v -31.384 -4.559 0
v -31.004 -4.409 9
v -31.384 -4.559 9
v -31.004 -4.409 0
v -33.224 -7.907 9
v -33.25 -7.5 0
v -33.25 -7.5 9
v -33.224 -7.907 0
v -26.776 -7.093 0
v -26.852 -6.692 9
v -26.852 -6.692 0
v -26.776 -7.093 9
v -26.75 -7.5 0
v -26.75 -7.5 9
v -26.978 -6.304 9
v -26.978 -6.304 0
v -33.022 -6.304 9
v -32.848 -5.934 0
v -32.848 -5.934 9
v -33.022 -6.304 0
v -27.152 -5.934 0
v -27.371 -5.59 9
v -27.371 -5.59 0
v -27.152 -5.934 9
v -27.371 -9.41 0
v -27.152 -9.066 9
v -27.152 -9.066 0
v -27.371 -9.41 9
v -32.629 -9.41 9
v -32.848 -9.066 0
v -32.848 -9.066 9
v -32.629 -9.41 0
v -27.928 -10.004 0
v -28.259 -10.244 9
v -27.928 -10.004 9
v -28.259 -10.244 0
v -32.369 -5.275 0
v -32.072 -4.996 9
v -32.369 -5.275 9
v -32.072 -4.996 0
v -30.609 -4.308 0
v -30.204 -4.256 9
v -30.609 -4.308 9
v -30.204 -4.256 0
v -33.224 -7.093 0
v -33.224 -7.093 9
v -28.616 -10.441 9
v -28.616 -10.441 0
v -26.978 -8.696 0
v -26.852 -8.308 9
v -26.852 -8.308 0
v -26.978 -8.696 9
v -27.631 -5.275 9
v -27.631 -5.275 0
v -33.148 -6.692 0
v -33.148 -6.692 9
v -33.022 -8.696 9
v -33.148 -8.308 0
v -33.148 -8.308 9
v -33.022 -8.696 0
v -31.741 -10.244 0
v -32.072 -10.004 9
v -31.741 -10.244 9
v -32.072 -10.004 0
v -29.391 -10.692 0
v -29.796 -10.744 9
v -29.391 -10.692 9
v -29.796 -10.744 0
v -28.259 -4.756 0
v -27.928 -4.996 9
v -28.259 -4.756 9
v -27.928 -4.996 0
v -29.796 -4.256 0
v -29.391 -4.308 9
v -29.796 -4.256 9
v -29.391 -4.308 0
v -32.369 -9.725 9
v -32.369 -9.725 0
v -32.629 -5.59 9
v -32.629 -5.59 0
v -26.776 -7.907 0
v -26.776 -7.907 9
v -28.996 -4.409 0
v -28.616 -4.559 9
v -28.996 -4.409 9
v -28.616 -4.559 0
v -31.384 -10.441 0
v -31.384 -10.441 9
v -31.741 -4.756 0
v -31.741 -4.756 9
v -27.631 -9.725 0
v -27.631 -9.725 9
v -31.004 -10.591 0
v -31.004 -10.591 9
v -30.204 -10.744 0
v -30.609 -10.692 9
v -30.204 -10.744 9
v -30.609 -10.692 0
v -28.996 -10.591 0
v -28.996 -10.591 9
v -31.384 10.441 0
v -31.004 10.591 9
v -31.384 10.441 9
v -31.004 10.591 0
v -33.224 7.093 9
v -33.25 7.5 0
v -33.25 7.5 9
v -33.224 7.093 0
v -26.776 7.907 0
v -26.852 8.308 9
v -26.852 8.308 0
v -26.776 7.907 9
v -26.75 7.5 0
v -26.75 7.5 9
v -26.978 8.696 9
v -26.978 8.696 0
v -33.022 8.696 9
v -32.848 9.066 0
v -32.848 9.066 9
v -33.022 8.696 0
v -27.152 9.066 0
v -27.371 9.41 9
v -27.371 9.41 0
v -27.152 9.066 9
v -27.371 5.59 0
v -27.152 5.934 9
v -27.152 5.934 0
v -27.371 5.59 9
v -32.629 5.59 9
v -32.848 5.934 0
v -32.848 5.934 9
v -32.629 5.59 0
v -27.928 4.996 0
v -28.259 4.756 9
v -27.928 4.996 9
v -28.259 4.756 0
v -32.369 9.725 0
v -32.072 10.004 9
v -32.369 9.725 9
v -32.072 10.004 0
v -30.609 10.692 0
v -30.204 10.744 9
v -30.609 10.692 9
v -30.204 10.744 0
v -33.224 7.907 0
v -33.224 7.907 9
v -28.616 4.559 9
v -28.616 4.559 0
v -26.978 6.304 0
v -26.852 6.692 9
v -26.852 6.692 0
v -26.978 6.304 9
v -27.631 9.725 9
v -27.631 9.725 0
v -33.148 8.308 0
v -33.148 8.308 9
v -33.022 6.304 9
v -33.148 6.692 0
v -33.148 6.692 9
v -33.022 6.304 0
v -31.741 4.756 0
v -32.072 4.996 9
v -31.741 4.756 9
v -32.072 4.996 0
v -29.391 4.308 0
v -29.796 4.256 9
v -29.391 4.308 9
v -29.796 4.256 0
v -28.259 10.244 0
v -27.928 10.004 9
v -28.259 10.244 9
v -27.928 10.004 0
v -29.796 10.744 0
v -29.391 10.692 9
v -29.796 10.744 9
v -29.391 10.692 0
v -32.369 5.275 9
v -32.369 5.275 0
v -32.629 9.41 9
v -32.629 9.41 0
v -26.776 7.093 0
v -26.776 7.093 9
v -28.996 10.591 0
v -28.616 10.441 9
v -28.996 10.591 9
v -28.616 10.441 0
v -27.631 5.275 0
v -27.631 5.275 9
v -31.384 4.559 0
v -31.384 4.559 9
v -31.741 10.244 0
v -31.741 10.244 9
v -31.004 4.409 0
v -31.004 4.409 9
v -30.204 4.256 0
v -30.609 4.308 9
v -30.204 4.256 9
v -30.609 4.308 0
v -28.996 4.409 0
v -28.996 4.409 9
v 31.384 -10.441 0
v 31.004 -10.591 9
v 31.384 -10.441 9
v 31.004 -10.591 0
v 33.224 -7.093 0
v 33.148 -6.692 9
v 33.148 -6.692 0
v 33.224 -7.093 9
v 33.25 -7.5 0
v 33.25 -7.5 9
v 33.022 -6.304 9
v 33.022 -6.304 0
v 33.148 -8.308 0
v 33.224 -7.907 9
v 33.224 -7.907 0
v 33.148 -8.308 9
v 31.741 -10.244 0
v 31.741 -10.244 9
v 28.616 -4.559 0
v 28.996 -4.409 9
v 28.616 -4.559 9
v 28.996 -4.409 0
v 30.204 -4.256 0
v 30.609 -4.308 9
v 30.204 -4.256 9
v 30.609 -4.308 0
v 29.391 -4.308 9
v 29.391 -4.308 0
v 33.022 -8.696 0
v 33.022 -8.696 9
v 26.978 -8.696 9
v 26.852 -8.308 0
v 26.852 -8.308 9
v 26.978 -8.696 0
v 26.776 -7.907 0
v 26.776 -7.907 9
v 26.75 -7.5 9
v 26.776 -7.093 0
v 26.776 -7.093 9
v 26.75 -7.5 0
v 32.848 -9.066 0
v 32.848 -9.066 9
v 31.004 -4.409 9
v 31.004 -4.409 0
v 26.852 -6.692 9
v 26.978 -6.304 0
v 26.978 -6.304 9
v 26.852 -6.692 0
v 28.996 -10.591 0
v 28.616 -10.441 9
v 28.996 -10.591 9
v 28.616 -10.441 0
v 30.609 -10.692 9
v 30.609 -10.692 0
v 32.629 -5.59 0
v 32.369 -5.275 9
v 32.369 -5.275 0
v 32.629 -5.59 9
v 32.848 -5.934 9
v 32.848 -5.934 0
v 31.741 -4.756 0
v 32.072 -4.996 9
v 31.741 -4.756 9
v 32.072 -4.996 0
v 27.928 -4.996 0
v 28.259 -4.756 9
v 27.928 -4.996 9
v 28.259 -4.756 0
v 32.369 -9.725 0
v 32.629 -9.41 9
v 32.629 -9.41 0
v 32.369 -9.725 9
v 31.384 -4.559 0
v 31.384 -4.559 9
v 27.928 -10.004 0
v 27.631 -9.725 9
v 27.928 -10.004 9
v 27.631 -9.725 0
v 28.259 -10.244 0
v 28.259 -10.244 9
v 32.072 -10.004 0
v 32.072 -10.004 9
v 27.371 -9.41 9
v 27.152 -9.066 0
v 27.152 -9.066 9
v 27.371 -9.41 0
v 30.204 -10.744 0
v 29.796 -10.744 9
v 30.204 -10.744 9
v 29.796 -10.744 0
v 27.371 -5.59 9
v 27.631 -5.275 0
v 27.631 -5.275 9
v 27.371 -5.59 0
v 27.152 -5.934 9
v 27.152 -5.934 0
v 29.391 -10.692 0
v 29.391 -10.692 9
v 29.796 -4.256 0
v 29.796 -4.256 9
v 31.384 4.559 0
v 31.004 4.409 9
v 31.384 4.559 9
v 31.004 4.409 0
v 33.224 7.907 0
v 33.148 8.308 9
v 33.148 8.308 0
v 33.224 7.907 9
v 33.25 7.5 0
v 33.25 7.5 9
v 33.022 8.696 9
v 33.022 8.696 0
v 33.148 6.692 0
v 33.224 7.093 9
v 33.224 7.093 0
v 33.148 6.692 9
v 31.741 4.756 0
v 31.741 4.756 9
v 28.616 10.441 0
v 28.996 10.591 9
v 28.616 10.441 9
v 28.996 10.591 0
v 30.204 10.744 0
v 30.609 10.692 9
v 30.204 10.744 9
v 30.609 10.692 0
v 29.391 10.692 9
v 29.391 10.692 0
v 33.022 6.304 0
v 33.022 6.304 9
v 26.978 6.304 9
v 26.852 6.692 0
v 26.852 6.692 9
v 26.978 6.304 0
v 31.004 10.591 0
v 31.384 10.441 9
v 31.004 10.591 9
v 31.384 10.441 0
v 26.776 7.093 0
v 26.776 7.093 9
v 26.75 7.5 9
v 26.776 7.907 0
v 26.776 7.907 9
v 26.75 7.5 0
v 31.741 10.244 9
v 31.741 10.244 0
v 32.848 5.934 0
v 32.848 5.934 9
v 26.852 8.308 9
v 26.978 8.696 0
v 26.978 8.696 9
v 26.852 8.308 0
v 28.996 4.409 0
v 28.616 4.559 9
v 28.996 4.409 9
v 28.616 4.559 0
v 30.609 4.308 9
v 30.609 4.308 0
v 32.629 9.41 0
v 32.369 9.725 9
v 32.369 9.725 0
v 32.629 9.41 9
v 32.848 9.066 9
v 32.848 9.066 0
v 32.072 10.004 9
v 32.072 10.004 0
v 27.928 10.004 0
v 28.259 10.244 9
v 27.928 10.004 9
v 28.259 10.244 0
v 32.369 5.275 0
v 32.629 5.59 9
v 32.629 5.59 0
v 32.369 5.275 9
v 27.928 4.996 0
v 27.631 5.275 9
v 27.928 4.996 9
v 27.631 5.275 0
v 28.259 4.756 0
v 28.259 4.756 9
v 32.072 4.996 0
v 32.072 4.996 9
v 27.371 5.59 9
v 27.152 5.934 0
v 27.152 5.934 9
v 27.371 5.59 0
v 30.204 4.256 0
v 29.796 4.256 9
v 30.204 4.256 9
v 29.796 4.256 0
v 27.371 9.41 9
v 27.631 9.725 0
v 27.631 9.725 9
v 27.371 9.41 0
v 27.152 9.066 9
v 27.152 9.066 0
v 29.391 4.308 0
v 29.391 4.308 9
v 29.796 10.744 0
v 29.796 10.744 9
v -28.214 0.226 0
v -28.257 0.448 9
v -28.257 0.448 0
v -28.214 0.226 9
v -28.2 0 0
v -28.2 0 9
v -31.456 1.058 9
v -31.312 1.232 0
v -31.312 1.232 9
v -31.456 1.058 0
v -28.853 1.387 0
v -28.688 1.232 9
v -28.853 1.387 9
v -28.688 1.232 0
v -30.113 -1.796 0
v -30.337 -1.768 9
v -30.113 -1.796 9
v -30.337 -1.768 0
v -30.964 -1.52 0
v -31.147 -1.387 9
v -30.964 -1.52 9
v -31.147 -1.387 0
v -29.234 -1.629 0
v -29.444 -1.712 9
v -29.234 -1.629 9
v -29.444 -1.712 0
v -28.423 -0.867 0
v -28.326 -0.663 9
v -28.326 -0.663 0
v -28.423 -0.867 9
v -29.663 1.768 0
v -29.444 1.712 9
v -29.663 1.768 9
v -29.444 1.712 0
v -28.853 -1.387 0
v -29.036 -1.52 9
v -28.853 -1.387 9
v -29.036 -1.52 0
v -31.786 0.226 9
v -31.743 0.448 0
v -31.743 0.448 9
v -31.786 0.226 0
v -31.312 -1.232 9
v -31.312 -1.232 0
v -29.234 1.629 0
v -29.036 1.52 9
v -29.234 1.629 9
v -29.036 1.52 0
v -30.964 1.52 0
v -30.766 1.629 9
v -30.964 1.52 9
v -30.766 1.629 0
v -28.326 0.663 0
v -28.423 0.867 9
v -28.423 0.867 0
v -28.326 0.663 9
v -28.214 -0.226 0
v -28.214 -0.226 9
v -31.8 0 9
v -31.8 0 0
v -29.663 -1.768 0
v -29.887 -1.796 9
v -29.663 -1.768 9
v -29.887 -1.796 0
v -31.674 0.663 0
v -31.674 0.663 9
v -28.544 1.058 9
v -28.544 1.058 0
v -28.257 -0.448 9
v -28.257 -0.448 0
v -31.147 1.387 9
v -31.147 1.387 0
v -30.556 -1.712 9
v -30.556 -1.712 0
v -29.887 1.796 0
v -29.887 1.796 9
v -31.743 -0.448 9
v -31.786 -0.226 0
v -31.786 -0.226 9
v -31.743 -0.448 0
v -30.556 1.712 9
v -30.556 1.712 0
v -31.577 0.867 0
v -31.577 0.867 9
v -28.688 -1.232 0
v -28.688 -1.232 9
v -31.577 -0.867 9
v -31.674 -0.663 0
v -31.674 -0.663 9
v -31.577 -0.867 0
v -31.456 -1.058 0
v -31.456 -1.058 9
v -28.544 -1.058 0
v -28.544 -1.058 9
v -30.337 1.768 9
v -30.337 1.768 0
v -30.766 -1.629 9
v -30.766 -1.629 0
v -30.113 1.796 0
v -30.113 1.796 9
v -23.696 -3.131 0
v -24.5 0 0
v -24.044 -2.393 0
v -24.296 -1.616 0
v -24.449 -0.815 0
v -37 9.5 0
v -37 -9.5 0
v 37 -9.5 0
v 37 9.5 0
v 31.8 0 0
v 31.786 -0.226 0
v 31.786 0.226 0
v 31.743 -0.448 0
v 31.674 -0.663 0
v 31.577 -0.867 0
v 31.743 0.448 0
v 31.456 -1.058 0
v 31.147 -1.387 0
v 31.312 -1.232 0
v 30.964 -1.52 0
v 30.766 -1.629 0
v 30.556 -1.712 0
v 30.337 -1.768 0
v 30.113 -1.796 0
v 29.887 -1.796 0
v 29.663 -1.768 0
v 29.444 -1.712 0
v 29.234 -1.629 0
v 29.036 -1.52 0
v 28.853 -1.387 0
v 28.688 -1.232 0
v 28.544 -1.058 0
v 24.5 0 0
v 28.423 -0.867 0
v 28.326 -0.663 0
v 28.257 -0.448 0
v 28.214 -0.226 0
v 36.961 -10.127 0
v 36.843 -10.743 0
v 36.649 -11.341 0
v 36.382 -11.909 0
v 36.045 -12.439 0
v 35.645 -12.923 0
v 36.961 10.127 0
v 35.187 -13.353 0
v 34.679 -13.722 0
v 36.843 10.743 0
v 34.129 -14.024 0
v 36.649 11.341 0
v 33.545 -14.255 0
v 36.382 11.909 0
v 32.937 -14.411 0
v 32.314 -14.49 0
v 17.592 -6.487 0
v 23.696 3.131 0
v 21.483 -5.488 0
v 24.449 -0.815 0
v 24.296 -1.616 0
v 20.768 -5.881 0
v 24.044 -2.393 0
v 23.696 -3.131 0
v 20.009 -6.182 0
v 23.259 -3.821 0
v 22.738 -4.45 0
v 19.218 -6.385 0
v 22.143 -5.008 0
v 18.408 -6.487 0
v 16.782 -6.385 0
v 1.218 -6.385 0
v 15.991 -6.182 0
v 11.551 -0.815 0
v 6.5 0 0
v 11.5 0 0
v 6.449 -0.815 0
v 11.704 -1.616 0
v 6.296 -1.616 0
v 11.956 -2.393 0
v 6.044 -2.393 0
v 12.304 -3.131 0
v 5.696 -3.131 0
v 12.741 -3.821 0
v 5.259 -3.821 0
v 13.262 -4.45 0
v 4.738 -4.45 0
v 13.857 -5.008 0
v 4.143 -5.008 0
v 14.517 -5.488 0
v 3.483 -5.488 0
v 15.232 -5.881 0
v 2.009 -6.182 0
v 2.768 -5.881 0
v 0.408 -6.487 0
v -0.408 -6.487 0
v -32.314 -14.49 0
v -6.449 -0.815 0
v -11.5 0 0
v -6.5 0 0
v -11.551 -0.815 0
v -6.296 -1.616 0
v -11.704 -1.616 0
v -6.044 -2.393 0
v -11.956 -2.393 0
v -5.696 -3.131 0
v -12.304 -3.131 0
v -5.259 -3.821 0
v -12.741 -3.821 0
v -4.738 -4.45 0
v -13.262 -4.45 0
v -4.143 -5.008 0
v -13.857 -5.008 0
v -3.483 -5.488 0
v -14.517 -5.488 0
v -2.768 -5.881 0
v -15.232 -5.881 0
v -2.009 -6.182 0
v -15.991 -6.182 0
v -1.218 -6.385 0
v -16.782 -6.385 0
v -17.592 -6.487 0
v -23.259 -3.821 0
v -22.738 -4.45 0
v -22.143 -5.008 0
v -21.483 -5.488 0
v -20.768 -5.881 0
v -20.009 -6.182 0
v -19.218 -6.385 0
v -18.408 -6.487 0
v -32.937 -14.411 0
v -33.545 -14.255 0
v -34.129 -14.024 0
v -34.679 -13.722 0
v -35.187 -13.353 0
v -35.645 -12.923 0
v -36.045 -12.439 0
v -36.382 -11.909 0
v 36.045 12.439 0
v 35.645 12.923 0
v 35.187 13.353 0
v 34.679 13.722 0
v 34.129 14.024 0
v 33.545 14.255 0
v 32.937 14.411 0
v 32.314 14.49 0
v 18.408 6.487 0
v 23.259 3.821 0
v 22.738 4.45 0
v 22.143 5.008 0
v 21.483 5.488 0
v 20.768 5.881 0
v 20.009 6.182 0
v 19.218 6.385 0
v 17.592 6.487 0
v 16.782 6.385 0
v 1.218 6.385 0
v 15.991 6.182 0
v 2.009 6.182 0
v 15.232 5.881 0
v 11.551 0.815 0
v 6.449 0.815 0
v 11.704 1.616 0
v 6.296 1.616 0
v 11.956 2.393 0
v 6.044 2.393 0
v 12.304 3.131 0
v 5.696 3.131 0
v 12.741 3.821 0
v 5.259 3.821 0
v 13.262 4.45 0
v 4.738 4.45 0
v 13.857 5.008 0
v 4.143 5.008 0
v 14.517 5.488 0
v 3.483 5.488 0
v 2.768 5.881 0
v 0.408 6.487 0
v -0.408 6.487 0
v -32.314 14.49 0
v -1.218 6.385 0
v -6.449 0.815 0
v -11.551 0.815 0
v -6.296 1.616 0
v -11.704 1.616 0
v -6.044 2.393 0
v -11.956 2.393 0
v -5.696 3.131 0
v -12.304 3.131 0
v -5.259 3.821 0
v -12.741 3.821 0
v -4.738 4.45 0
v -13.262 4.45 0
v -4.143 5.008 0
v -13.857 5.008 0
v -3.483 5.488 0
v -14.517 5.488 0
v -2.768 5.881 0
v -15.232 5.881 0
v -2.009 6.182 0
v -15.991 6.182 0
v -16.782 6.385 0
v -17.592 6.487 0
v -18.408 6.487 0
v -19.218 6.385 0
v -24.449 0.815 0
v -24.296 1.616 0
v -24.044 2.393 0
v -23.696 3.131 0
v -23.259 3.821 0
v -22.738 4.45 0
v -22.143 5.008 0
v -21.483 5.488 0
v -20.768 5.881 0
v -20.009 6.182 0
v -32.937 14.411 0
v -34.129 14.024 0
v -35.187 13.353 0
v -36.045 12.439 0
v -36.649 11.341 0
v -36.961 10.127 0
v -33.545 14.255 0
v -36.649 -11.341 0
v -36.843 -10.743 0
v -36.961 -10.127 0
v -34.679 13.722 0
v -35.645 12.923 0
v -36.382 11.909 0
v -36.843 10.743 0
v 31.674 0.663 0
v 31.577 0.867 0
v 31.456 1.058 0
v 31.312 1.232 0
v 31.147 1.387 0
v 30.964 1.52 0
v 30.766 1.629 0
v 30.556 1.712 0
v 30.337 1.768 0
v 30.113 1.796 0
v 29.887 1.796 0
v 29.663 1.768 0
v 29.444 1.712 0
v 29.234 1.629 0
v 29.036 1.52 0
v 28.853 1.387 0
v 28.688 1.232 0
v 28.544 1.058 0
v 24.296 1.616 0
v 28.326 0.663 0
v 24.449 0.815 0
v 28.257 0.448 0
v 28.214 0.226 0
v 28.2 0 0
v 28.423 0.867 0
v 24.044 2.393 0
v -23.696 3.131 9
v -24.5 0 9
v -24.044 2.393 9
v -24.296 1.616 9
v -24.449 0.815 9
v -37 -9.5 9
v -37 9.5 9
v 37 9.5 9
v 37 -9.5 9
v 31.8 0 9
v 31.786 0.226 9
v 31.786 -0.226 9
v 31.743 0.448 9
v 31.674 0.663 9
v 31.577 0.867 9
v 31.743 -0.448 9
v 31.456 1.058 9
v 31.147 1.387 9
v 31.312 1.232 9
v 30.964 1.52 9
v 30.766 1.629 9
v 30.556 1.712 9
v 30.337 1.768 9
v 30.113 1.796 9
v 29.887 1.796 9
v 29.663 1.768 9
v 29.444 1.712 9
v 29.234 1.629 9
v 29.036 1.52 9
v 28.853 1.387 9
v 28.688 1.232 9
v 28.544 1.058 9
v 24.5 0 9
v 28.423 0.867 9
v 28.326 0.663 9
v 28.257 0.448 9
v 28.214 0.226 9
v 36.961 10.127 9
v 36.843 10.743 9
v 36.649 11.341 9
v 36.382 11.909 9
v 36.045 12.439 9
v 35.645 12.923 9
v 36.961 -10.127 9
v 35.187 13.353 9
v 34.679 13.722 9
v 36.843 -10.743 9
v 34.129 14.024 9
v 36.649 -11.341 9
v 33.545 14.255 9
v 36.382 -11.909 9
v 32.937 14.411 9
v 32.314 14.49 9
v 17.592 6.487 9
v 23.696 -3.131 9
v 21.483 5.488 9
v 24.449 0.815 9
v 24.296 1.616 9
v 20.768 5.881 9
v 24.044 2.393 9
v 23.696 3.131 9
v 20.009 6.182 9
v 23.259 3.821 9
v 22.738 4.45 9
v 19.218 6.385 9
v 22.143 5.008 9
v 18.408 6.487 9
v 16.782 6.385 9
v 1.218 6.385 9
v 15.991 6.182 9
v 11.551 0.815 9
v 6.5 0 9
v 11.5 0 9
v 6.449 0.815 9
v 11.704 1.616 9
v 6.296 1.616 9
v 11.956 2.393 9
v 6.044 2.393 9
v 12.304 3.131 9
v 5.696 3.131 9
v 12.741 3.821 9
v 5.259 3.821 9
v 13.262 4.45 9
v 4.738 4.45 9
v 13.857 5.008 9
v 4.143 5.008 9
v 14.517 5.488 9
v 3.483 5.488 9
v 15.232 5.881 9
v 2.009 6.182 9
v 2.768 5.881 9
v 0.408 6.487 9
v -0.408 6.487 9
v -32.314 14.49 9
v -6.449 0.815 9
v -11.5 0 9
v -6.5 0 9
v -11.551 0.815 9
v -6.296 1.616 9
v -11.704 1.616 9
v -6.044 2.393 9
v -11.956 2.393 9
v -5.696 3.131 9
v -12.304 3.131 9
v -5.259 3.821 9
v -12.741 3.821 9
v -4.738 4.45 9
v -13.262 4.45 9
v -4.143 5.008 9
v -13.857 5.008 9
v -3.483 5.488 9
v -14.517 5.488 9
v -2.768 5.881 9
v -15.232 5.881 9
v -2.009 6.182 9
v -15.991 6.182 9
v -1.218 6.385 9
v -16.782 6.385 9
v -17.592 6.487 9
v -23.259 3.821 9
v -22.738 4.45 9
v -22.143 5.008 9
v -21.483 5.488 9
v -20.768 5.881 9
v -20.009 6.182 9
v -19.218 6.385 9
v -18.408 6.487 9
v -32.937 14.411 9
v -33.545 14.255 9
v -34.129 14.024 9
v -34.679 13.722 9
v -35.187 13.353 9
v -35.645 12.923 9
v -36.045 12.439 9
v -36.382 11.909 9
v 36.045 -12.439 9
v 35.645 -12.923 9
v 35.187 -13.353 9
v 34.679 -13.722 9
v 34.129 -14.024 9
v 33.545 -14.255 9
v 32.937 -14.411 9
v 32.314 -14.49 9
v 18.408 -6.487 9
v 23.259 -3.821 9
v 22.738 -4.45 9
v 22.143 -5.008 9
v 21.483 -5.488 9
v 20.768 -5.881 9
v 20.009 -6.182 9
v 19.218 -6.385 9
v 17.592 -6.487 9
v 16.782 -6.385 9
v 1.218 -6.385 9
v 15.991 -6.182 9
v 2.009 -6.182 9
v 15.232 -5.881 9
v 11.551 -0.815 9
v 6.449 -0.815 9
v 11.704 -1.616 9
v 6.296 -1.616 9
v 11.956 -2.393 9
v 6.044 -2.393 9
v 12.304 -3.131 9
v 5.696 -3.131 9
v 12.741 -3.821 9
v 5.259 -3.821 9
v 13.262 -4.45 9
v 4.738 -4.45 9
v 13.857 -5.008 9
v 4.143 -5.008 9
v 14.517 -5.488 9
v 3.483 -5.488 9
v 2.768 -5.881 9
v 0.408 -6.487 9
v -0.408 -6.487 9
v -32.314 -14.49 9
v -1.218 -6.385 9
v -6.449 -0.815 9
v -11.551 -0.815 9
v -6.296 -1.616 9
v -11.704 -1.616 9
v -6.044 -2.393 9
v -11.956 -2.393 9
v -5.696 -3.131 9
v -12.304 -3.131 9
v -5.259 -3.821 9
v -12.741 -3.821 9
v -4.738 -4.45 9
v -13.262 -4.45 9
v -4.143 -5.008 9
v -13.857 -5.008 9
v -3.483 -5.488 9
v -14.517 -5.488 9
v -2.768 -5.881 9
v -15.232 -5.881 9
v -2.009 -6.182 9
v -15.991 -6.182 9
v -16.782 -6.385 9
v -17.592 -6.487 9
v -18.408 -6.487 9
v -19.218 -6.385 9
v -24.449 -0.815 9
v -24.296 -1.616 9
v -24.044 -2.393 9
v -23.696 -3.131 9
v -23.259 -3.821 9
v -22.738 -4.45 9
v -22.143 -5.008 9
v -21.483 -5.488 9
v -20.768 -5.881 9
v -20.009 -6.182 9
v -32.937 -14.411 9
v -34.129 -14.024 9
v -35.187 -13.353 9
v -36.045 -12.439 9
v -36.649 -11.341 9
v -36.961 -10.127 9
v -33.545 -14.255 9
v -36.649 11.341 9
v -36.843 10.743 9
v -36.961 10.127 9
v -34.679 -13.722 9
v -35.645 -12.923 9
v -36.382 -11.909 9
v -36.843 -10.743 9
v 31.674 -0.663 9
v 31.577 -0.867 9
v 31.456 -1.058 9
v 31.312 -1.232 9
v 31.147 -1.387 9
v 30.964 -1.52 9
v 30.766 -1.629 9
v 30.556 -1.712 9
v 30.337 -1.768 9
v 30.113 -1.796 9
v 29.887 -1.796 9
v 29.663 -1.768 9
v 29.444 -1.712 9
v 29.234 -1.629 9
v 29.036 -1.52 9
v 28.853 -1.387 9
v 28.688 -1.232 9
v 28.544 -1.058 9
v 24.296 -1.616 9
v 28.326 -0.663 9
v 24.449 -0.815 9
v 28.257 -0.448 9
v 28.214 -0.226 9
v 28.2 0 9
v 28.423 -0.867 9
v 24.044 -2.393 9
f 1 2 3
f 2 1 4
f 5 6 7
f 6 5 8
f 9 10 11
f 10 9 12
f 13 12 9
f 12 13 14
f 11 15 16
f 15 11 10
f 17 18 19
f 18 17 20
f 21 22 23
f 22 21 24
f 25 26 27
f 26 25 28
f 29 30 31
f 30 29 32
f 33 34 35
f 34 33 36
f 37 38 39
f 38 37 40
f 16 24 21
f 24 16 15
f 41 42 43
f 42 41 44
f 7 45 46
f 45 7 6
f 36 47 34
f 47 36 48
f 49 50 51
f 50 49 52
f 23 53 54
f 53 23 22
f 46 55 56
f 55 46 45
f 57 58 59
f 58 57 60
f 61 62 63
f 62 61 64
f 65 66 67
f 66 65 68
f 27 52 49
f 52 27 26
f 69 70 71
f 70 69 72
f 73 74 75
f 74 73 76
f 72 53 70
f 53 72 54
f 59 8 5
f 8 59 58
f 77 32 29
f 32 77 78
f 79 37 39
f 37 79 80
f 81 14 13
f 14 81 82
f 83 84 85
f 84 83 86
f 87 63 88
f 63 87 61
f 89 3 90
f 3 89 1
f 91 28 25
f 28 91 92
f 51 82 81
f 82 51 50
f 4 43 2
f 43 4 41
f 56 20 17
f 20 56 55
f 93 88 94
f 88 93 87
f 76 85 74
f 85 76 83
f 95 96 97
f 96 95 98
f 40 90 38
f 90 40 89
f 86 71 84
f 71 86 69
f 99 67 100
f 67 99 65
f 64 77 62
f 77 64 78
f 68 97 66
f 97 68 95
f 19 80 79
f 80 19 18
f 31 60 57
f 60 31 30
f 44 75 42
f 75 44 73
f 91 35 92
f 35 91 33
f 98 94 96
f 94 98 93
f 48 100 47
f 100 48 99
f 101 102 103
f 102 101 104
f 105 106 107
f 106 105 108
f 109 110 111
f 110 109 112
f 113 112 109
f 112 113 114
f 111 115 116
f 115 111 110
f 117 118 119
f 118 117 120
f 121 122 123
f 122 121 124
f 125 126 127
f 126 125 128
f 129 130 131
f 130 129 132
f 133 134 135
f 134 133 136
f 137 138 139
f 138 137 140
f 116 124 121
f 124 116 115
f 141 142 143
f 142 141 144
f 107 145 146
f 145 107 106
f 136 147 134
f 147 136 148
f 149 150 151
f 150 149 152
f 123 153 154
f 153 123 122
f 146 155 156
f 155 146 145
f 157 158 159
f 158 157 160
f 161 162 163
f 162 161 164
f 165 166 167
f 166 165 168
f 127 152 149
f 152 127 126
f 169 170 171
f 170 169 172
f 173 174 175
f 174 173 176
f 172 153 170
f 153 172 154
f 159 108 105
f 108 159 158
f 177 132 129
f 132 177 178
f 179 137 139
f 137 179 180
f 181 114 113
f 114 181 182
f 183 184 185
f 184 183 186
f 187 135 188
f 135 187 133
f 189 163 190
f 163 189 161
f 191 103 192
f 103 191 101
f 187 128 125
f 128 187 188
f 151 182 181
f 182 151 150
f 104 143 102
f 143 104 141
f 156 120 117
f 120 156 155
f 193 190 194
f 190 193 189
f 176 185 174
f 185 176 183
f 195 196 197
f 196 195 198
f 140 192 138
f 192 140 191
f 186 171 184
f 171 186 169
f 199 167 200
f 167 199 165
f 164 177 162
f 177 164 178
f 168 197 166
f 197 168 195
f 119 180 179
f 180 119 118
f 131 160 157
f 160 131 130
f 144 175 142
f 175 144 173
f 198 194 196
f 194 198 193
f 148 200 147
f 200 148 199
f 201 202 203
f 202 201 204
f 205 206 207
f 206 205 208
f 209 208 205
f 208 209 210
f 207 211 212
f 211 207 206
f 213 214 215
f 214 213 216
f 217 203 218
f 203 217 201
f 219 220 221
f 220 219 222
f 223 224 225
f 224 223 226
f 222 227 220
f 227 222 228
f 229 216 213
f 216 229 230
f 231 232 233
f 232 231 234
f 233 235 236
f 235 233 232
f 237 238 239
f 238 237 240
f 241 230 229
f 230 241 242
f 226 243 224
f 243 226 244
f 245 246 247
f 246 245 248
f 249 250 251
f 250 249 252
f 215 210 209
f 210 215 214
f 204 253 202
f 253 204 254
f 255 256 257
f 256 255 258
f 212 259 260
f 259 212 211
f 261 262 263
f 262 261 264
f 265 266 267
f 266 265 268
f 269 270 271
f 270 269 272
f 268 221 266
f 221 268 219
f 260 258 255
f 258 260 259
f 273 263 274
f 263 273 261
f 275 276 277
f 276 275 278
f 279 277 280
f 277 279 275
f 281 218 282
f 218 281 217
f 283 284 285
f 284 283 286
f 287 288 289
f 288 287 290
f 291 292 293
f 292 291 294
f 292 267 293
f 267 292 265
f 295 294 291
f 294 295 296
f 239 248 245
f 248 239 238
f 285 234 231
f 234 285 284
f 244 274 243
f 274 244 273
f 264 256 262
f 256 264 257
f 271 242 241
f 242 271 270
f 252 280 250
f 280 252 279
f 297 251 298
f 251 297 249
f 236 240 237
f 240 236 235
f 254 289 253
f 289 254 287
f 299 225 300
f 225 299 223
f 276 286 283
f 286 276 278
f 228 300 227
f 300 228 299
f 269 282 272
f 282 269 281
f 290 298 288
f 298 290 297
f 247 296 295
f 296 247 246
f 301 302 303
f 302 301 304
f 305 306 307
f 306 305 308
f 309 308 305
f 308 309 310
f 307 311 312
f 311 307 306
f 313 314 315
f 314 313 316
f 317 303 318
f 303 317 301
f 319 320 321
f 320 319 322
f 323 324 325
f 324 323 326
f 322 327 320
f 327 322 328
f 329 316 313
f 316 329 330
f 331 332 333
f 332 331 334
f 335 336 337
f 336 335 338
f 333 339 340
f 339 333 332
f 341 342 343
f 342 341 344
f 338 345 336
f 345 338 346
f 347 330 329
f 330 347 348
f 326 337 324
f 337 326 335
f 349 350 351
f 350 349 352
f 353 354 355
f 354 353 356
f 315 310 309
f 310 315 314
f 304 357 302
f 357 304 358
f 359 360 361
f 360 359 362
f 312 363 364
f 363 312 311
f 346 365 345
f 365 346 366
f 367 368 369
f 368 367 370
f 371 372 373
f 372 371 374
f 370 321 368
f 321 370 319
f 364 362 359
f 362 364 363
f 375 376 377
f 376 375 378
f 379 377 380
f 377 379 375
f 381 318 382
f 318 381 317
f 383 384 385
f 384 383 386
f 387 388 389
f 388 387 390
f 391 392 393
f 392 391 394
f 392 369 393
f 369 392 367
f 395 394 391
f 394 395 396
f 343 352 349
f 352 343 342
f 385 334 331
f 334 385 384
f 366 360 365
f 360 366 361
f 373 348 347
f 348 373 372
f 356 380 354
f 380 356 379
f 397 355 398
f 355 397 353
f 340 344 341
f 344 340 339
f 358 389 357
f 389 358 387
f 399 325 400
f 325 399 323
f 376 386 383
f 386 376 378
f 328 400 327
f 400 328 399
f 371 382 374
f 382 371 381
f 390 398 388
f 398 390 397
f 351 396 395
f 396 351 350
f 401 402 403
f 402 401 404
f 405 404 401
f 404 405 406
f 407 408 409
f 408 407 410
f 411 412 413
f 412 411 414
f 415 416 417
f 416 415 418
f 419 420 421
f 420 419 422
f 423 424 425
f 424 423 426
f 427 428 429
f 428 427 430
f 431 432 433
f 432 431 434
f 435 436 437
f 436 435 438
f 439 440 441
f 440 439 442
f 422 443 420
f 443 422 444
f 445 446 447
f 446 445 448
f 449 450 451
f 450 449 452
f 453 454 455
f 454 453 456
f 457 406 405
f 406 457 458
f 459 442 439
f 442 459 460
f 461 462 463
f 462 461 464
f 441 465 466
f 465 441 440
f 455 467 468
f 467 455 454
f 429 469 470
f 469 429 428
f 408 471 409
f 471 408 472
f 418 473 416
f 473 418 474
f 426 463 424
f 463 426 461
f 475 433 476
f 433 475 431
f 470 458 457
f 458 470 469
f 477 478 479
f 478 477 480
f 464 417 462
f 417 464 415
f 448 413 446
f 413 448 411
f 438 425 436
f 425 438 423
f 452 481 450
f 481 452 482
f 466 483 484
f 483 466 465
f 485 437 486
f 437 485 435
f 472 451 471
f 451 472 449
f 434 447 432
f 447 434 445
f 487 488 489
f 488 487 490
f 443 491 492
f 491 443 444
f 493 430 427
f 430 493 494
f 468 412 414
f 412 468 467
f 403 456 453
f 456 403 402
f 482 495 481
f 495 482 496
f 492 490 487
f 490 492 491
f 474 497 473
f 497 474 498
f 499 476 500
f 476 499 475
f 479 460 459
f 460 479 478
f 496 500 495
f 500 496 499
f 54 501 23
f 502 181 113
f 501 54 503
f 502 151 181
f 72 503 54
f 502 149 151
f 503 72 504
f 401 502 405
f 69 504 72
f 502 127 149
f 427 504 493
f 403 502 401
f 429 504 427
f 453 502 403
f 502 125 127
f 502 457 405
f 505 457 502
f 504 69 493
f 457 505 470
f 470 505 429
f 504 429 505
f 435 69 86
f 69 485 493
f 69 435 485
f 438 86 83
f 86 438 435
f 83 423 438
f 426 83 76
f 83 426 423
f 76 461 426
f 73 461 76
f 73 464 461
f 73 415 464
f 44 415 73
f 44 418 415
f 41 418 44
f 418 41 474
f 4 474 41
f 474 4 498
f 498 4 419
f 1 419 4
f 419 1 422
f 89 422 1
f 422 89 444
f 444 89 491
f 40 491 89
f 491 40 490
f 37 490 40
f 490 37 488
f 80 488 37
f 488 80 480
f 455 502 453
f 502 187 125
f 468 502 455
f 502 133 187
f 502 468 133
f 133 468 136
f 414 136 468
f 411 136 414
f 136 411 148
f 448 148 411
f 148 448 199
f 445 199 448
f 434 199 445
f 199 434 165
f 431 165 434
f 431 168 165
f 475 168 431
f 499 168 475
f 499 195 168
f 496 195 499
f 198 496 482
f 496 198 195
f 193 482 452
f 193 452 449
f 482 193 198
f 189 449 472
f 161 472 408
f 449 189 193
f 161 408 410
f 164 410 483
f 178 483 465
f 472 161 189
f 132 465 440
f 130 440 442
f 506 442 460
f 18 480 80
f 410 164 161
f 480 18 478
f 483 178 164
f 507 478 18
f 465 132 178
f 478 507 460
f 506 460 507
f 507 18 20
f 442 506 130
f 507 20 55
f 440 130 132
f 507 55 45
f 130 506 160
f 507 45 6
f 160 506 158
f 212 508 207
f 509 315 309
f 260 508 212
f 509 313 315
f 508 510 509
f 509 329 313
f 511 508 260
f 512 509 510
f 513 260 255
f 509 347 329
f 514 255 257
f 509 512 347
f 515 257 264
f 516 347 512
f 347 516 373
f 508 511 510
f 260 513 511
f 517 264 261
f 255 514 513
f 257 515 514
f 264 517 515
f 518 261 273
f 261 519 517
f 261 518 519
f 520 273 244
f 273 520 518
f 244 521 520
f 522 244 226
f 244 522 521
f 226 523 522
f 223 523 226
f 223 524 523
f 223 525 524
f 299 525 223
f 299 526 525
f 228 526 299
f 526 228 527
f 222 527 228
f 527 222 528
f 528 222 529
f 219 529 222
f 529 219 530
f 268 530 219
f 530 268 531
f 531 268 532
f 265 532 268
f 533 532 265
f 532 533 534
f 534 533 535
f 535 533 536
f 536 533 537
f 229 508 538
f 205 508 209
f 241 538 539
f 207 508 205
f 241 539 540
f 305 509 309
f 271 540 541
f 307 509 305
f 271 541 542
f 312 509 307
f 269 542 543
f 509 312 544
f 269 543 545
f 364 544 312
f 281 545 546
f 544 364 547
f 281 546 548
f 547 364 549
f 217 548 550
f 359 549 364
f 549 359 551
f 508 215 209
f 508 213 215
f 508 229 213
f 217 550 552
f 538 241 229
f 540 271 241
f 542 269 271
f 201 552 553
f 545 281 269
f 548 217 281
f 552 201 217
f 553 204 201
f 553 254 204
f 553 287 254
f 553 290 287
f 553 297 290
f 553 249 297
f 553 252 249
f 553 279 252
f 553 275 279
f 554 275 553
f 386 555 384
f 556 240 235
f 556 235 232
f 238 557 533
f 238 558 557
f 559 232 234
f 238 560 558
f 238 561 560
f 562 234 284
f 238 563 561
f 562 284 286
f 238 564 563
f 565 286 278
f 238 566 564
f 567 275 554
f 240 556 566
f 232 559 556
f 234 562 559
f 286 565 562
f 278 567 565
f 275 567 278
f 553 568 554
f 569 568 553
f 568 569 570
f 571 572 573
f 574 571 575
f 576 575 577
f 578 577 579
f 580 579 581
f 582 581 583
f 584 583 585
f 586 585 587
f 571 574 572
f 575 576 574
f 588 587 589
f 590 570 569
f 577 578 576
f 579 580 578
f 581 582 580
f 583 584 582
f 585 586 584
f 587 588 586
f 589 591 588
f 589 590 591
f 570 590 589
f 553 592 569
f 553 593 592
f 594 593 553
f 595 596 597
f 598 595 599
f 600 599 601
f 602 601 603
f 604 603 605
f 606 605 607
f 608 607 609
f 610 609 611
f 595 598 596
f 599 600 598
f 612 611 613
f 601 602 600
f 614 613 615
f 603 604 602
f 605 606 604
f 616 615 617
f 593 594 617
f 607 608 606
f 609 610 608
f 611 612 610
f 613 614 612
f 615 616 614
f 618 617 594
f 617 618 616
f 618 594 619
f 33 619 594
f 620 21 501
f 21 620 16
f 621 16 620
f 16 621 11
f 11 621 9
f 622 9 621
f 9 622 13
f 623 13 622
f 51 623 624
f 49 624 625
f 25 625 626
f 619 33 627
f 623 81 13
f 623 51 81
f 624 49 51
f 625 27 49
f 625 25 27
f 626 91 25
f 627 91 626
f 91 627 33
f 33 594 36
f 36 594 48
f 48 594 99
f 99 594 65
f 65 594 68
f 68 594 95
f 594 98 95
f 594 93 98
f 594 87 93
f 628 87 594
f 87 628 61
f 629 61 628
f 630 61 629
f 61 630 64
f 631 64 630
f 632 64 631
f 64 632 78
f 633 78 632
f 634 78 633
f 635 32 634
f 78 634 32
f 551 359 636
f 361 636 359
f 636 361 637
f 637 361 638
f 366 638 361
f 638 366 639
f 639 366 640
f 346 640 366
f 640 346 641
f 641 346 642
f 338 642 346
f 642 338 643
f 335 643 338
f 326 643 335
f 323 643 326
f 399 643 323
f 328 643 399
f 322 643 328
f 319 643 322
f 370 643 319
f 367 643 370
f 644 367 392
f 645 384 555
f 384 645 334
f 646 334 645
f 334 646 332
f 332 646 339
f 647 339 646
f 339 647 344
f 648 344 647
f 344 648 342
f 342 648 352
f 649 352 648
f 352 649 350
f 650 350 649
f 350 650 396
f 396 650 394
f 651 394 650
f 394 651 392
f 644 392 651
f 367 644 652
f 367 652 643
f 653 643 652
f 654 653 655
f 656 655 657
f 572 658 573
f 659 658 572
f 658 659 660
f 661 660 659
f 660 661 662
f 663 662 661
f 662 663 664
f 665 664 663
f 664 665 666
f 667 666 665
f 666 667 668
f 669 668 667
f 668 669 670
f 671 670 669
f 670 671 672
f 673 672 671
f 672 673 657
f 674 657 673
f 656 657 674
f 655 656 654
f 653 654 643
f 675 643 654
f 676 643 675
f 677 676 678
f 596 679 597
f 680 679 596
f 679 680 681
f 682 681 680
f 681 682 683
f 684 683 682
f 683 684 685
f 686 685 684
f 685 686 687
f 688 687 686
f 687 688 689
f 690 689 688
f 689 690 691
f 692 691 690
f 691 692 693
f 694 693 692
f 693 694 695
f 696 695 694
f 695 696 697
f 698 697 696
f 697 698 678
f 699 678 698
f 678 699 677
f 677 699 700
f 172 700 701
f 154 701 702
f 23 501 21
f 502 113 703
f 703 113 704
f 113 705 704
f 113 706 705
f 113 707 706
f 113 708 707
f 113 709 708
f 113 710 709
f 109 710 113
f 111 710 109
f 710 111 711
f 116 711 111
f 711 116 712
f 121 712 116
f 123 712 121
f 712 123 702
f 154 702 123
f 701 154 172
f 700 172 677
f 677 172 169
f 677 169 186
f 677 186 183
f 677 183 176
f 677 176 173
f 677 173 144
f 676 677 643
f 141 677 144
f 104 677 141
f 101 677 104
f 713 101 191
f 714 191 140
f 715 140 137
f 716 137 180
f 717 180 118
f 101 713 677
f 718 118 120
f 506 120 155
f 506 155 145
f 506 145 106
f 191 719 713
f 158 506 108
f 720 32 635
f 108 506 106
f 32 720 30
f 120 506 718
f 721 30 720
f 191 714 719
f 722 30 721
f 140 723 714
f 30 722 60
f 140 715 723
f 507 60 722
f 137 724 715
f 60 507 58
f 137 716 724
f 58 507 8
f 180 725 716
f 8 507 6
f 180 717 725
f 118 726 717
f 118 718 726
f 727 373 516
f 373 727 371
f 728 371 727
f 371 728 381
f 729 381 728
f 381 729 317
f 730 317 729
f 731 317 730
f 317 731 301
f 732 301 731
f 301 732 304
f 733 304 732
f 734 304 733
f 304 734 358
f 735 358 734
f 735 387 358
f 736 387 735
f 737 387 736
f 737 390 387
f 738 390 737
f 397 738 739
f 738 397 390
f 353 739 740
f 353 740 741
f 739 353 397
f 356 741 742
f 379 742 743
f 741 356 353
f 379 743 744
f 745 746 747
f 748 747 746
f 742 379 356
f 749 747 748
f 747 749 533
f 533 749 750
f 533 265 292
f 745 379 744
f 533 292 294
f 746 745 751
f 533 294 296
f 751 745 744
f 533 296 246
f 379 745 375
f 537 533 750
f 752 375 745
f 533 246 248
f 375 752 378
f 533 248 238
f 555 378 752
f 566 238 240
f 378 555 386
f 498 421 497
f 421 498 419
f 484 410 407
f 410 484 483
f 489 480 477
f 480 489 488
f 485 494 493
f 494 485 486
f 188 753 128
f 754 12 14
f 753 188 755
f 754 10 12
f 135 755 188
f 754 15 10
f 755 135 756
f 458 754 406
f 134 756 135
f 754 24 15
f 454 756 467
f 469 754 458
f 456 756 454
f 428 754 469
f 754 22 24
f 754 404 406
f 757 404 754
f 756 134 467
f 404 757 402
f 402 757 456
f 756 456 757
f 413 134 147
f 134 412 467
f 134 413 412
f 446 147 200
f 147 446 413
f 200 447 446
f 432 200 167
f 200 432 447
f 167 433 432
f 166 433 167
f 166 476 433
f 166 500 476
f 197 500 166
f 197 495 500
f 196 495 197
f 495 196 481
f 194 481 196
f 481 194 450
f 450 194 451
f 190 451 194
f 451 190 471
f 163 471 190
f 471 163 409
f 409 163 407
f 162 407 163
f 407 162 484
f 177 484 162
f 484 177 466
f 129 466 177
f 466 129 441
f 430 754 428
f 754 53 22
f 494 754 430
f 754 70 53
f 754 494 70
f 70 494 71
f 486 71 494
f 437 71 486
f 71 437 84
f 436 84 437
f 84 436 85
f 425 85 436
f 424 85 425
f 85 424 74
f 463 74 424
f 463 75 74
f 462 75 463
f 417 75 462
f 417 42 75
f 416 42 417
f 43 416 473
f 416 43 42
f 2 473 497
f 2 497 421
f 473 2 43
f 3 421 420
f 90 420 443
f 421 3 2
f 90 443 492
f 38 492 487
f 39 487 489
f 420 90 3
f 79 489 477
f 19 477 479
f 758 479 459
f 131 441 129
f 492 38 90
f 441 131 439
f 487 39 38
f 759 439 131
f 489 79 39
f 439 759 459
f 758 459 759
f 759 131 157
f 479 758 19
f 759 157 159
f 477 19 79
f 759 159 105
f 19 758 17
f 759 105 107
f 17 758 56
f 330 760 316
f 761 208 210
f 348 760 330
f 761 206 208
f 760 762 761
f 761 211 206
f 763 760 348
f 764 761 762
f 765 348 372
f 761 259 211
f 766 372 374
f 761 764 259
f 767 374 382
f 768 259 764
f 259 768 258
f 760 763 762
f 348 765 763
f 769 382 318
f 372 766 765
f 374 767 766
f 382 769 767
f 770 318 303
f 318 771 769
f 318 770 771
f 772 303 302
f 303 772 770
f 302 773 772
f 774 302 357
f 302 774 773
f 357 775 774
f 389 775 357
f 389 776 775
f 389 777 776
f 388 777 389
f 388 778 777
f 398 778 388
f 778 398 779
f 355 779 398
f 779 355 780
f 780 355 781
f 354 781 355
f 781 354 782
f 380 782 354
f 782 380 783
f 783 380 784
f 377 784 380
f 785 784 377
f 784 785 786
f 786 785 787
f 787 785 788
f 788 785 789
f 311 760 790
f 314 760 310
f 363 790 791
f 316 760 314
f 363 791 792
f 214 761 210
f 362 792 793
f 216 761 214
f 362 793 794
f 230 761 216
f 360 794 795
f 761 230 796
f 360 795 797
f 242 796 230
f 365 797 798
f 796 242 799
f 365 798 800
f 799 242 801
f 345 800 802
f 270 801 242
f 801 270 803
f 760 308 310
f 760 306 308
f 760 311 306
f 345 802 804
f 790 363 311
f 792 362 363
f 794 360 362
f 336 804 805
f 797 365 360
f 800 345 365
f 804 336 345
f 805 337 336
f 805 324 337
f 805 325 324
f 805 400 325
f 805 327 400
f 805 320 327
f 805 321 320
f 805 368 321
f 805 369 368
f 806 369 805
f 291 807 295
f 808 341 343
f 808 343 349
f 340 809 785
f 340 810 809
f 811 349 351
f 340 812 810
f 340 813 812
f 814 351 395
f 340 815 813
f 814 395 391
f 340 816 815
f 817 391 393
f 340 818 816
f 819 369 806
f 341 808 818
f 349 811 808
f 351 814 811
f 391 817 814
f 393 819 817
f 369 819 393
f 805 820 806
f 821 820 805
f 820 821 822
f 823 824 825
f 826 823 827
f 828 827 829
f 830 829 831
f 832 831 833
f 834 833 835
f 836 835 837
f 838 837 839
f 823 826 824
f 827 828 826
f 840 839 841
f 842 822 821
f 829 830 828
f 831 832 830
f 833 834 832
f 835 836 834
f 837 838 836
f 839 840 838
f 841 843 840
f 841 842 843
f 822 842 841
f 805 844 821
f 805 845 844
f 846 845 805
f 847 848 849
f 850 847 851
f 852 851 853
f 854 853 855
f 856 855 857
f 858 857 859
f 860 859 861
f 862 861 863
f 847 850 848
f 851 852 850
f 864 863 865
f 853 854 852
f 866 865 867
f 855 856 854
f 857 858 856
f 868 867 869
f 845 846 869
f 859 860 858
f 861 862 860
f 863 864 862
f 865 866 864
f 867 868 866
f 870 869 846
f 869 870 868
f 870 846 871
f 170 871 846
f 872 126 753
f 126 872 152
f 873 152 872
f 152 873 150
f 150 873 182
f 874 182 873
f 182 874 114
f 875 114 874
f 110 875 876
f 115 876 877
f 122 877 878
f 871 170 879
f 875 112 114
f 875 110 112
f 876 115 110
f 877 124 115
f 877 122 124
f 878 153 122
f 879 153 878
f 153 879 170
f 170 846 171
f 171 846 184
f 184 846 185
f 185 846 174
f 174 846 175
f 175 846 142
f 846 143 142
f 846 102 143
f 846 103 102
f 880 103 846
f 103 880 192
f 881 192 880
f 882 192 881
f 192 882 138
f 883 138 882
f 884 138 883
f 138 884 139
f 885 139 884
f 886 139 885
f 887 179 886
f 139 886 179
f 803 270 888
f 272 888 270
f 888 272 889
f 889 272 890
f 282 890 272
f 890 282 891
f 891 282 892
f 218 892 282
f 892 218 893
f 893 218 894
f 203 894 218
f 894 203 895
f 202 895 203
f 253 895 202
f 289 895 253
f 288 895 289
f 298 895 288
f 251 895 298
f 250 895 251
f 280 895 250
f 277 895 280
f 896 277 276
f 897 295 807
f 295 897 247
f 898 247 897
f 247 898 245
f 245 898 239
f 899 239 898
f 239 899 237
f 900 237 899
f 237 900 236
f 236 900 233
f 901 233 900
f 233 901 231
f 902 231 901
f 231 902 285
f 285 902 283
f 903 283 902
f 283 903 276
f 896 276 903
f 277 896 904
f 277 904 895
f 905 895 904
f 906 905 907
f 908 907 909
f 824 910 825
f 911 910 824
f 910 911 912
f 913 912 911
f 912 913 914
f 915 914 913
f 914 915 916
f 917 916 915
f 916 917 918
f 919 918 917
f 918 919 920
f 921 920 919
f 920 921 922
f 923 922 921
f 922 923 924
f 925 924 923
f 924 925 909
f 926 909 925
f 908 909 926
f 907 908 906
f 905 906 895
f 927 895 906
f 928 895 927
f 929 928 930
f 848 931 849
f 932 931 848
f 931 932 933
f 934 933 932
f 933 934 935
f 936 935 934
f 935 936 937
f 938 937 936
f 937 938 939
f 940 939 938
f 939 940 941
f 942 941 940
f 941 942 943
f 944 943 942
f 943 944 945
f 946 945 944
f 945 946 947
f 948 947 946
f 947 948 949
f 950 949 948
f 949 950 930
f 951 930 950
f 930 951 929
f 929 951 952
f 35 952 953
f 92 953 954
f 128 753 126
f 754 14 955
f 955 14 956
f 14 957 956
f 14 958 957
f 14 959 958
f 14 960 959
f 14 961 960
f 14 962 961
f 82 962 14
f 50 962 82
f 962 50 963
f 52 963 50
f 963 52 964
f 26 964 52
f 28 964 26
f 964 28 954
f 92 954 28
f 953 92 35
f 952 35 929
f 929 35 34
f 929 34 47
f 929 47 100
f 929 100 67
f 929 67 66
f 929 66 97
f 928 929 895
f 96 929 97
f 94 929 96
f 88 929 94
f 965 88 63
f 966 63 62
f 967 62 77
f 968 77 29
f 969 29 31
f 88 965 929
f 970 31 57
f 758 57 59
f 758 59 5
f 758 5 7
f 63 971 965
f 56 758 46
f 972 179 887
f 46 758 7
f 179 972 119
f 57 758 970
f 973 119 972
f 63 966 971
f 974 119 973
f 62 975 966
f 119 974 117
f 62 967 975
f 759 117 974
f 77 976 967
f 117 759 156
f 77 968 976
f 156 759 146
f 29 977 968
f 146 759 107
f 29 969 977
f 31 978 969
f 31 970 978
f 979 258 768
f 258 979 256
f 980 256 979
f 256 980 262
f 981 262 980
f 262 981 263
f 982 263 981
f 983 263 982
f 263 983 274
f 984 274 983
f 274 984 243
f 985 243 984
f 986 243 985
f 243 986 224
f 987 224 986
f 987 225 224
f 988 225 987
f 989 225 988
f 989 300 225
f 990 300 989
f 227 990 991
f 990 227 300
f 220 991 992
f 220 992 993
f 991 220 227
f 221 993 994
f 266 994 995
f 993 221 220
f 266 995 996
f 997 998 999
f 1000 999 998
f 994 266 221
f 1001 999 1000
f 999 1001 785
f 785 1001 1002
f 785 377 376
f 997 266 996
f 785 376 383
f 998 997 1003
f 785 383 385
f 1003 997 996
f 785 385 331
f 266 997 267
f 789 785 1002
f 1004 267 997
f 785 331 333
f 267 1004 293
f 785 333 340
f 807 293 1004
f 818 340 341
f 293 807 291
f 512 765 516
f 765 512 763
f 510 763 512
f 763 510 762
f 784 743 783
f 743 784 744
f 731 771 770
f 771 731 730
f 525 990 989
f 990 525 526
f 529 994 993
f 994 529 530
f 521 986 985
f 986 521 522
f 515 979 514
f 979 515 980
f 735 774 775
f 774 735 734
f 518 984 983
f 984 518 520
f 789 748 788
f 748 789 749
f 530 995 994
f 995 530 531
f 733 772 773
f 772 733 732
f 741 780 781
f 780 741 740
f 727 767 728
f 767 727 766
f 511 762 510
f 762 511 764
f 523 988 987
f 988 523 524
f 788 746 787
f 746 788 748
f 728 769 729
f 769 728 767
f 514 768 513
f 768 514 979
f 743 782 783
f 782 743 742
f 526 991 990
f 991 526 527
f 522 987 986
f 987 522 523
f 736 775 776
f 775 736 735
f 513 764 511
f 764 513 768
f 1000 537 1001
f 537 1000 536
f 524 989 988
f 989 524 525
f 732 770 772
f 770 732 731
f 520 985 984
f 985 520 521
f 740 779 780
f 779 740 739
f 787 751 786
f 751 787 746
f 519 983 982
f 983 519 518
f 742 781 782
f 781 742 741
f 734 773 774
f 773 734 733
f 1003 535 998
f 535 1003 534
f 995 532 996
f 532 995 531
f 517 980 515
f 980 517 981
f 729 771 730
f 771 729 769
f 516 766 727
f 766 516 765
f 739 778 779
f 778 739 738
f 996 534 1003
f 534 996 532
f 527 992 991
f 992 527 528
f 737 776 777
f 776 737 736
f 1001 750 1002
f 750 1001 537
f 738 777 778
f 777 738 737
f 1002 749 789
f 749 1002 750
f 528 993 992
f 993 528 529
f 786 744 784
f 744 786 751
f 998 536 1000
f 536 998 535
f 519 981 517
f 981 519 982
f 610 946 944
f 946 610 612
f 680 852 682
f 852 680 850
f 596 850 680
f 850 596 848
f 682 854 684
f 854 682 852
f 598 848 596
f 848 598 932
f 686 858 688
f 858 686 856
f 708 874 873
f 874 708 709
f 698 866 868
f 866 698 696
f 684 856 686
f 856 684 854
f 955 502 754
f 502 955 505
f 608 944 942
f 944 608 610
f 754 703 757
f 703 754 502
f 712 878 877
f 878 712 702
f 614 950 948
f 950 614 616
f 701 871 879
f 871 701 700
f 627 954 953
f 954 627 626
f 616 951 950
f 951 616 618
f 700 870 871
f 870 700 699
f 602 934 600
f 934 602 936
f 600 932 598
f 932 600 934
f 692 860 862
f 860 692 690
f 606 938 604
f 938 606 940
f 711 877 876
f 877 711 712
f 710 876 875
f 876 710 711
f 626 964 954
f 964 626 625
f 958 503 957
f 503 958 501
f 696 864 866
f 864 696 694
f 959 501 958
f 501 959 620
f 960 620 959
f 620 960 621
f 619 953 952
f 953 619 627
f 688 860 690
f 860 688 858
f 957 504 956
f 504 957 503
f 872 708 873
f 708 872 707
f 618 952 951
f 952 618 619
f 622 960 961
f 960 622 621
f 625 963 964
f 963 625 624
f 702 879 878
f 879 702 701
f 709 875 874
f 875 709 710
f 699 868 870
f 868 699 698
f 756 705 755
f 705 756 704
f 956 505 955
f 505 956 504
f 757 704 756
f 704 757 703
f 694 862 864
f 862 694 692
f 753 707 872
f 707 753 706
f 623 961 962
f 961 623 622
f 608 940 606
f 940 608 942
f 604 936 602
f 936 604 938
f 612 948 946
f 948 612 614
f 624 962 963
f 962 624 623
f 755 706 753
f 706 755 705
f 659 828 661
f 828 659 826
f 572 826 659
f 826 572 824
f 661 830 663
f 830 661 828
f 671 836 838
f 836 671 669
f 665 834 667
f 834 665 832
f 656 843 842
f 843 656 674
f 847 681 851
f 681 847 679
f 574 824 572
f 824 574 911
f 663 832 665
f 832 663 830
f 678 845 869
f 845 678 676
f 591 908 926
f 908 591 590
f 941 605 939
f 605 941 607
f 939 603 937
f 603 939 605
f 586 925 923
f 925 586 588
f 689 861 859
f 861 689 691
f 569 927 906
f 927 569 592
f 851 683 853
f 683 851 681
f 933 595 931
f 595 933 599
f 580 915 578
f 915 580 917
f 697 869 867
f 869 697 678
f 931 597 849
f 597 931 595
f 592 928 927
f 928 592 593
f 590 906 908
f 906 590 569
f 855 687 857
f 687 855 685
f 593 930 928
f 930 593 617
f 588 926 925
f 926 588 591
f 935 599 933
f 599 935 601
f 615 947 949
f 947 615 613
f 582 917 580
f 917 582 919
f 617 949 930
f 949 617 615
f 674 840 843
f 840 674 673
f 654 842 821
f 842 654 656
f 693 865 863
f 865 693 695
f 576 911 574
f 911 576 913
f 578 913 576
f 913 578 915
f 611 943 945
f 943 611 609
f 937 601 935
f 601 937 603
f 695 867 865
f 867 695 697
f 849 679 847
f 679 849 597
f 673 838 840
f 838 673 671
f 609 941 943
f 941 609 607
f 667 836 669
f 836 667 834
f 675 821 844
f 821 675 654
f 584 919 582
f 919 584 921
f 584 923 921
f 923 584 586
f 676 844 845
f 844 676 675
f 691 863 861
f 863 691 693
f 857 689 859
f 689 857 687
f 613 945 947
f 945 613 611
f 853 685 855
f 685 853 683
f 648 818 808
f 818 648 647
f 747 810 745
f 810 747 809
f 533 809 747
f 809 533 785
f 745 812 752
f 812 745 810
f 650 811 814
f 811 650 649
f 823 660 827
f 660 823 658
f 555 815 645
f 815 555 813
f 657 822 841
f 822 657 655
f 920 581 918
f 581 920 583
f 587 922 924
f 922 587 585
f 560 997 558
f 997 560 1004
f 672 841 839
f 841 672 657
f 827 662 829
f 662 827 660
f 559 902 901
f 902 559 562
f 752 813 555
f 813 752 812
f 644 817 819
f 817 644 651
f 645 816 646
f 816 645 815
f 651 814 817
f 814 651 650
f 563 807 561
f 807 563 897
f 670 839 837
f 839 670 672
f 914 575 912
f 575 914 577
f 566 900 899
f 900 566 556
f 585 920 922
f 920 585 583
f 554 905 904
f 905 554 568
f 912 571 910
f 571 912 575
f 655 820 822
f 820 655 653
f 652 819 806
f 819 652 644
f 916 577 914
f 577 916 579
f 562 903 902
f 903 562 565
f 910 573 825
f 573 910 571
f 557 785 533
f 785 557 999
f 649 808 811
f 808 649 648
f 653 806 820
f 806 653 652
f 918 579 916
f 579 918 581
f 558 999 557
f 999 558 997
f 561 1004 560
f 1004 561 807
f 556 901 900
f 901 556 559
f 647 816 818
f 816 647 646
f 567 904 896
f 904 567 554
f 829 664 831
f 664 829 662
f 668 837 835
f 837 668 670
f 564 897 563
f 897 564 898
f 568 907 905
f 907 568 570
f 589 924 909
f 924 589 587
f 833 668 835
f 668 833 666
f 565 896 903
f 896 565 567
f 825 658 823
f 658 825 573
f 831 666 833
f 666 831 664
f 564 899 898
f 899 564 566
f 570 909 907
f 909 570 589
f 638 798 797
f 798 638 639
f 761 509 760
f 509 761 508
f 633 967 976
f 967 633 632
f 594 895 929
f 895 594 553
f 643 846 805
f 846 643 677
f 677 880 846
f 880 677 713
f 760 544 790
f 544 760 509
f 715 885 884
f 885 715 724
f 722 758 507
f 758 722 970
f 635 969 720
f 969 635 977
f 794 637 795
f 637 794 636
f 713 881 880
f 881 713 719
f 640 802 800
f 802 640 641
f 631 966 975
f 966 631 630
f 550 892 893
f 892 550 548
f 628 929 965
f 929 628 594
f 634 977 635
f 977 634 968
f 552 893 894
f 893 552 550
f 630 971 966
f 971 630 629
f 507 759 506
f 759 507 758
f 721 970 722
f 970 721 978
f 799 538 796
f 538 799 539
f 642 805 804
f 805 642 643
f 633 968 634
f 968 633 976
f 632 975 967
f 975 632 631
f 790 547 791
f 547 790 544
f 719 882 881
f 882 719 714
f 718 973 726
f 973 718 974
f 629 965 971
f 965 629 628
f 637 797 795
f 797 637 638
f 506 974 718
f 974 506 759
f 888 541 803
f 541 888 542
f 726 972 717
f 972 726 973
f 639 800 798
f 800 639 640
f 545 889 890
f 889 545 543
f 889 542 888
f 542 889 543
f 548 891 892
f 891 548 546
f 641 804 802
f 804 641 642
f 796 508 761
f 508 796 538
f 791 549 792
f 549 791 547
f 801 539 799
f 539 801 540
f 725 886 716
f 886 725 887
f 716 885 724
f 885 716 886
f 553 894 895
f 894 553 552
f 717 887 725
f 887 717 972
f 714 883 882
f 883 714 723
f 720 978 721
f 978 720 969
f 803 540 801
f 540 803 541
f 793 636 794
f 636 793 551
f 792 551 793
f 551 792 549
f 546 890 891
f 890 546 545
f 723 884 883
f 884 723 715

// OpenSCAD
$fn = 50;


difference() {
	union() {
		hull() {
			translate(v = [-32.0000000000, 9.5000000000, 0]) {
				cylinder(h = 9, r = 5);
			}
			translate(v = [32.0000000000, 9.5000000000, 0]) {
				cylinder(h = 9, r = 5);
			}
			translate(v = [-32.0000000000, -9.5000000000, 0]) {
				cylinder(h = 9, r = 5);
			}
			translate(v = [32.0000000000, -9.5000000000, 0]) {
				cylinder(h = 9, r = 5);
			}
		}
	}
	union() {
		#translate(v = [-30.0000000000, -7.5000000000, 0]) {
			cylinder(h = 9, r = 3.2500000000);
		}
		#translate(v = [-30.0000000000, 7.5000000000, 0]) {
			cylinder(h = 9, r = 3.2500000000);
		}
		#translate(v = [30.0000000000, -7.5000000000, 0]) {
			cylinder(h = 9, r = 3.2500000000);
		}
		#translate(v = [30.0000000000, 7.5000000000, 0]) {
			cylinder(h = 9, r = 3.2500000000);
		}
		#translate(v = [-30.0000000000, -7.5000000000, -100.0000000000]) {
			cylinder(h = 200, r = 3.2500000000);
		}
		#translate(v = [-30.0000000000, 7.5000000000, -100.0000000000]) {
			cylinder(h = 200, r = 3.2500000000);
		}
		#translate(v = [30.0000000000, -7.5000000000, -100.0000000000]) {
			cylinder(h = 200, r = 3.2500000000);
		}
		#translate(v = [30.0000000000, 7.5000000000, -100.0000000000]) {
			cylinder(h = 200, r = 3.2500000000);
		}
		#translate(v = [-30.0000000000, -7.5000000000, 0]) {
			cylinder(h = 9, r = 1.8000000000);
		}
		#translate(v = [-30.0000000000, 0.0000000000, 0]) {
			cylinder(h = 9, r = 1.8000000000);
		}
		#translate(v = [-30.0000000000, 7.5000000000, 0]) {
			cylinder(h = 9, r = 1.8000000000);
		}
		#translate(v = [30.0000000000, -7.5000000000, 0]) {
			cylinder(h = 9, r = 1.8000000000);
		}
		#translate(v = [30.0000000000, 0.0000000000, 0]) {
			cylinder(h = 9, r = 1.8000000000);
		}
		#translate(v = [30.0000000000, 7.5000000000, 0]) {
			cylinder(h = 9, r = 1.8000000000);
		}
		#translate(v = [-30.0000000000, -7.5000000000, 0]) {
			cylinder(h = 9, r = 1.8000000000);
		}
		#translate(v = [-30.0000000000, 0.0000000000, 0]) {
			cylinder(h = 9, r = 1.8000000000);
		}
		#translate(v = [-30.0000000000, 7.5000000000, 0]) {
			cylinder(h = 9, r = 1.8000000000);
		}
		#translate(v = [30.0000000000, -7.5000000000, 0]) {
			cylinder(h = 9, r = 1.8000000000);
		}
		#translate(v = [30.0000000000, 0.0000000000, 0]) {
			cylinder(h = 9, r = 1.8000000000);
		}
		#translate(v = [30.0000000000, 7.5000000000, 0]) {
			cylinder(h = 9, r = 1.8000000000);
		}
		#translate(v = [-30.0000000000, -7.5000000000, 0]) {
			cylinder(h = 9, r = 1.8000000000);
		}
		#translate(v = [-30.0000000000, 0.0000000000, 0]) {
			cylinder(h = 9, r = 1.8000000000);
		}
		#translate(v = [-30.0000000000, 7.5000000000, 0]) {
			cylinder(h = 9, r = 1.8000000000);
		}
		#translate(v = [30.0000000000, -7.5000000000, 0]) {
			cylinder(h = 9, r = 1.8000000000);
		}
		#translate(v = [30.0000000000, 0.0000000000, 0]) {
			cylinder(h = 9, r = 1.8000000000);
		}
		#translate(v = [30.0000000000, 7.5000000000, 0]) {
			cylinder(h = 9, r = 1.8000000000);
		}
		#translate(v = [-18.0000000000, 0, 0]) {
			cylinder(h = 9, r = 6.5000000000);
		}
		#cylinder(h = 9, r = 6.5000000000);
		#translate(v = [18.0000000000, 0, 0]) {
			cylinder(h = 9, r = 6.5000000000);
		}
	}
}
